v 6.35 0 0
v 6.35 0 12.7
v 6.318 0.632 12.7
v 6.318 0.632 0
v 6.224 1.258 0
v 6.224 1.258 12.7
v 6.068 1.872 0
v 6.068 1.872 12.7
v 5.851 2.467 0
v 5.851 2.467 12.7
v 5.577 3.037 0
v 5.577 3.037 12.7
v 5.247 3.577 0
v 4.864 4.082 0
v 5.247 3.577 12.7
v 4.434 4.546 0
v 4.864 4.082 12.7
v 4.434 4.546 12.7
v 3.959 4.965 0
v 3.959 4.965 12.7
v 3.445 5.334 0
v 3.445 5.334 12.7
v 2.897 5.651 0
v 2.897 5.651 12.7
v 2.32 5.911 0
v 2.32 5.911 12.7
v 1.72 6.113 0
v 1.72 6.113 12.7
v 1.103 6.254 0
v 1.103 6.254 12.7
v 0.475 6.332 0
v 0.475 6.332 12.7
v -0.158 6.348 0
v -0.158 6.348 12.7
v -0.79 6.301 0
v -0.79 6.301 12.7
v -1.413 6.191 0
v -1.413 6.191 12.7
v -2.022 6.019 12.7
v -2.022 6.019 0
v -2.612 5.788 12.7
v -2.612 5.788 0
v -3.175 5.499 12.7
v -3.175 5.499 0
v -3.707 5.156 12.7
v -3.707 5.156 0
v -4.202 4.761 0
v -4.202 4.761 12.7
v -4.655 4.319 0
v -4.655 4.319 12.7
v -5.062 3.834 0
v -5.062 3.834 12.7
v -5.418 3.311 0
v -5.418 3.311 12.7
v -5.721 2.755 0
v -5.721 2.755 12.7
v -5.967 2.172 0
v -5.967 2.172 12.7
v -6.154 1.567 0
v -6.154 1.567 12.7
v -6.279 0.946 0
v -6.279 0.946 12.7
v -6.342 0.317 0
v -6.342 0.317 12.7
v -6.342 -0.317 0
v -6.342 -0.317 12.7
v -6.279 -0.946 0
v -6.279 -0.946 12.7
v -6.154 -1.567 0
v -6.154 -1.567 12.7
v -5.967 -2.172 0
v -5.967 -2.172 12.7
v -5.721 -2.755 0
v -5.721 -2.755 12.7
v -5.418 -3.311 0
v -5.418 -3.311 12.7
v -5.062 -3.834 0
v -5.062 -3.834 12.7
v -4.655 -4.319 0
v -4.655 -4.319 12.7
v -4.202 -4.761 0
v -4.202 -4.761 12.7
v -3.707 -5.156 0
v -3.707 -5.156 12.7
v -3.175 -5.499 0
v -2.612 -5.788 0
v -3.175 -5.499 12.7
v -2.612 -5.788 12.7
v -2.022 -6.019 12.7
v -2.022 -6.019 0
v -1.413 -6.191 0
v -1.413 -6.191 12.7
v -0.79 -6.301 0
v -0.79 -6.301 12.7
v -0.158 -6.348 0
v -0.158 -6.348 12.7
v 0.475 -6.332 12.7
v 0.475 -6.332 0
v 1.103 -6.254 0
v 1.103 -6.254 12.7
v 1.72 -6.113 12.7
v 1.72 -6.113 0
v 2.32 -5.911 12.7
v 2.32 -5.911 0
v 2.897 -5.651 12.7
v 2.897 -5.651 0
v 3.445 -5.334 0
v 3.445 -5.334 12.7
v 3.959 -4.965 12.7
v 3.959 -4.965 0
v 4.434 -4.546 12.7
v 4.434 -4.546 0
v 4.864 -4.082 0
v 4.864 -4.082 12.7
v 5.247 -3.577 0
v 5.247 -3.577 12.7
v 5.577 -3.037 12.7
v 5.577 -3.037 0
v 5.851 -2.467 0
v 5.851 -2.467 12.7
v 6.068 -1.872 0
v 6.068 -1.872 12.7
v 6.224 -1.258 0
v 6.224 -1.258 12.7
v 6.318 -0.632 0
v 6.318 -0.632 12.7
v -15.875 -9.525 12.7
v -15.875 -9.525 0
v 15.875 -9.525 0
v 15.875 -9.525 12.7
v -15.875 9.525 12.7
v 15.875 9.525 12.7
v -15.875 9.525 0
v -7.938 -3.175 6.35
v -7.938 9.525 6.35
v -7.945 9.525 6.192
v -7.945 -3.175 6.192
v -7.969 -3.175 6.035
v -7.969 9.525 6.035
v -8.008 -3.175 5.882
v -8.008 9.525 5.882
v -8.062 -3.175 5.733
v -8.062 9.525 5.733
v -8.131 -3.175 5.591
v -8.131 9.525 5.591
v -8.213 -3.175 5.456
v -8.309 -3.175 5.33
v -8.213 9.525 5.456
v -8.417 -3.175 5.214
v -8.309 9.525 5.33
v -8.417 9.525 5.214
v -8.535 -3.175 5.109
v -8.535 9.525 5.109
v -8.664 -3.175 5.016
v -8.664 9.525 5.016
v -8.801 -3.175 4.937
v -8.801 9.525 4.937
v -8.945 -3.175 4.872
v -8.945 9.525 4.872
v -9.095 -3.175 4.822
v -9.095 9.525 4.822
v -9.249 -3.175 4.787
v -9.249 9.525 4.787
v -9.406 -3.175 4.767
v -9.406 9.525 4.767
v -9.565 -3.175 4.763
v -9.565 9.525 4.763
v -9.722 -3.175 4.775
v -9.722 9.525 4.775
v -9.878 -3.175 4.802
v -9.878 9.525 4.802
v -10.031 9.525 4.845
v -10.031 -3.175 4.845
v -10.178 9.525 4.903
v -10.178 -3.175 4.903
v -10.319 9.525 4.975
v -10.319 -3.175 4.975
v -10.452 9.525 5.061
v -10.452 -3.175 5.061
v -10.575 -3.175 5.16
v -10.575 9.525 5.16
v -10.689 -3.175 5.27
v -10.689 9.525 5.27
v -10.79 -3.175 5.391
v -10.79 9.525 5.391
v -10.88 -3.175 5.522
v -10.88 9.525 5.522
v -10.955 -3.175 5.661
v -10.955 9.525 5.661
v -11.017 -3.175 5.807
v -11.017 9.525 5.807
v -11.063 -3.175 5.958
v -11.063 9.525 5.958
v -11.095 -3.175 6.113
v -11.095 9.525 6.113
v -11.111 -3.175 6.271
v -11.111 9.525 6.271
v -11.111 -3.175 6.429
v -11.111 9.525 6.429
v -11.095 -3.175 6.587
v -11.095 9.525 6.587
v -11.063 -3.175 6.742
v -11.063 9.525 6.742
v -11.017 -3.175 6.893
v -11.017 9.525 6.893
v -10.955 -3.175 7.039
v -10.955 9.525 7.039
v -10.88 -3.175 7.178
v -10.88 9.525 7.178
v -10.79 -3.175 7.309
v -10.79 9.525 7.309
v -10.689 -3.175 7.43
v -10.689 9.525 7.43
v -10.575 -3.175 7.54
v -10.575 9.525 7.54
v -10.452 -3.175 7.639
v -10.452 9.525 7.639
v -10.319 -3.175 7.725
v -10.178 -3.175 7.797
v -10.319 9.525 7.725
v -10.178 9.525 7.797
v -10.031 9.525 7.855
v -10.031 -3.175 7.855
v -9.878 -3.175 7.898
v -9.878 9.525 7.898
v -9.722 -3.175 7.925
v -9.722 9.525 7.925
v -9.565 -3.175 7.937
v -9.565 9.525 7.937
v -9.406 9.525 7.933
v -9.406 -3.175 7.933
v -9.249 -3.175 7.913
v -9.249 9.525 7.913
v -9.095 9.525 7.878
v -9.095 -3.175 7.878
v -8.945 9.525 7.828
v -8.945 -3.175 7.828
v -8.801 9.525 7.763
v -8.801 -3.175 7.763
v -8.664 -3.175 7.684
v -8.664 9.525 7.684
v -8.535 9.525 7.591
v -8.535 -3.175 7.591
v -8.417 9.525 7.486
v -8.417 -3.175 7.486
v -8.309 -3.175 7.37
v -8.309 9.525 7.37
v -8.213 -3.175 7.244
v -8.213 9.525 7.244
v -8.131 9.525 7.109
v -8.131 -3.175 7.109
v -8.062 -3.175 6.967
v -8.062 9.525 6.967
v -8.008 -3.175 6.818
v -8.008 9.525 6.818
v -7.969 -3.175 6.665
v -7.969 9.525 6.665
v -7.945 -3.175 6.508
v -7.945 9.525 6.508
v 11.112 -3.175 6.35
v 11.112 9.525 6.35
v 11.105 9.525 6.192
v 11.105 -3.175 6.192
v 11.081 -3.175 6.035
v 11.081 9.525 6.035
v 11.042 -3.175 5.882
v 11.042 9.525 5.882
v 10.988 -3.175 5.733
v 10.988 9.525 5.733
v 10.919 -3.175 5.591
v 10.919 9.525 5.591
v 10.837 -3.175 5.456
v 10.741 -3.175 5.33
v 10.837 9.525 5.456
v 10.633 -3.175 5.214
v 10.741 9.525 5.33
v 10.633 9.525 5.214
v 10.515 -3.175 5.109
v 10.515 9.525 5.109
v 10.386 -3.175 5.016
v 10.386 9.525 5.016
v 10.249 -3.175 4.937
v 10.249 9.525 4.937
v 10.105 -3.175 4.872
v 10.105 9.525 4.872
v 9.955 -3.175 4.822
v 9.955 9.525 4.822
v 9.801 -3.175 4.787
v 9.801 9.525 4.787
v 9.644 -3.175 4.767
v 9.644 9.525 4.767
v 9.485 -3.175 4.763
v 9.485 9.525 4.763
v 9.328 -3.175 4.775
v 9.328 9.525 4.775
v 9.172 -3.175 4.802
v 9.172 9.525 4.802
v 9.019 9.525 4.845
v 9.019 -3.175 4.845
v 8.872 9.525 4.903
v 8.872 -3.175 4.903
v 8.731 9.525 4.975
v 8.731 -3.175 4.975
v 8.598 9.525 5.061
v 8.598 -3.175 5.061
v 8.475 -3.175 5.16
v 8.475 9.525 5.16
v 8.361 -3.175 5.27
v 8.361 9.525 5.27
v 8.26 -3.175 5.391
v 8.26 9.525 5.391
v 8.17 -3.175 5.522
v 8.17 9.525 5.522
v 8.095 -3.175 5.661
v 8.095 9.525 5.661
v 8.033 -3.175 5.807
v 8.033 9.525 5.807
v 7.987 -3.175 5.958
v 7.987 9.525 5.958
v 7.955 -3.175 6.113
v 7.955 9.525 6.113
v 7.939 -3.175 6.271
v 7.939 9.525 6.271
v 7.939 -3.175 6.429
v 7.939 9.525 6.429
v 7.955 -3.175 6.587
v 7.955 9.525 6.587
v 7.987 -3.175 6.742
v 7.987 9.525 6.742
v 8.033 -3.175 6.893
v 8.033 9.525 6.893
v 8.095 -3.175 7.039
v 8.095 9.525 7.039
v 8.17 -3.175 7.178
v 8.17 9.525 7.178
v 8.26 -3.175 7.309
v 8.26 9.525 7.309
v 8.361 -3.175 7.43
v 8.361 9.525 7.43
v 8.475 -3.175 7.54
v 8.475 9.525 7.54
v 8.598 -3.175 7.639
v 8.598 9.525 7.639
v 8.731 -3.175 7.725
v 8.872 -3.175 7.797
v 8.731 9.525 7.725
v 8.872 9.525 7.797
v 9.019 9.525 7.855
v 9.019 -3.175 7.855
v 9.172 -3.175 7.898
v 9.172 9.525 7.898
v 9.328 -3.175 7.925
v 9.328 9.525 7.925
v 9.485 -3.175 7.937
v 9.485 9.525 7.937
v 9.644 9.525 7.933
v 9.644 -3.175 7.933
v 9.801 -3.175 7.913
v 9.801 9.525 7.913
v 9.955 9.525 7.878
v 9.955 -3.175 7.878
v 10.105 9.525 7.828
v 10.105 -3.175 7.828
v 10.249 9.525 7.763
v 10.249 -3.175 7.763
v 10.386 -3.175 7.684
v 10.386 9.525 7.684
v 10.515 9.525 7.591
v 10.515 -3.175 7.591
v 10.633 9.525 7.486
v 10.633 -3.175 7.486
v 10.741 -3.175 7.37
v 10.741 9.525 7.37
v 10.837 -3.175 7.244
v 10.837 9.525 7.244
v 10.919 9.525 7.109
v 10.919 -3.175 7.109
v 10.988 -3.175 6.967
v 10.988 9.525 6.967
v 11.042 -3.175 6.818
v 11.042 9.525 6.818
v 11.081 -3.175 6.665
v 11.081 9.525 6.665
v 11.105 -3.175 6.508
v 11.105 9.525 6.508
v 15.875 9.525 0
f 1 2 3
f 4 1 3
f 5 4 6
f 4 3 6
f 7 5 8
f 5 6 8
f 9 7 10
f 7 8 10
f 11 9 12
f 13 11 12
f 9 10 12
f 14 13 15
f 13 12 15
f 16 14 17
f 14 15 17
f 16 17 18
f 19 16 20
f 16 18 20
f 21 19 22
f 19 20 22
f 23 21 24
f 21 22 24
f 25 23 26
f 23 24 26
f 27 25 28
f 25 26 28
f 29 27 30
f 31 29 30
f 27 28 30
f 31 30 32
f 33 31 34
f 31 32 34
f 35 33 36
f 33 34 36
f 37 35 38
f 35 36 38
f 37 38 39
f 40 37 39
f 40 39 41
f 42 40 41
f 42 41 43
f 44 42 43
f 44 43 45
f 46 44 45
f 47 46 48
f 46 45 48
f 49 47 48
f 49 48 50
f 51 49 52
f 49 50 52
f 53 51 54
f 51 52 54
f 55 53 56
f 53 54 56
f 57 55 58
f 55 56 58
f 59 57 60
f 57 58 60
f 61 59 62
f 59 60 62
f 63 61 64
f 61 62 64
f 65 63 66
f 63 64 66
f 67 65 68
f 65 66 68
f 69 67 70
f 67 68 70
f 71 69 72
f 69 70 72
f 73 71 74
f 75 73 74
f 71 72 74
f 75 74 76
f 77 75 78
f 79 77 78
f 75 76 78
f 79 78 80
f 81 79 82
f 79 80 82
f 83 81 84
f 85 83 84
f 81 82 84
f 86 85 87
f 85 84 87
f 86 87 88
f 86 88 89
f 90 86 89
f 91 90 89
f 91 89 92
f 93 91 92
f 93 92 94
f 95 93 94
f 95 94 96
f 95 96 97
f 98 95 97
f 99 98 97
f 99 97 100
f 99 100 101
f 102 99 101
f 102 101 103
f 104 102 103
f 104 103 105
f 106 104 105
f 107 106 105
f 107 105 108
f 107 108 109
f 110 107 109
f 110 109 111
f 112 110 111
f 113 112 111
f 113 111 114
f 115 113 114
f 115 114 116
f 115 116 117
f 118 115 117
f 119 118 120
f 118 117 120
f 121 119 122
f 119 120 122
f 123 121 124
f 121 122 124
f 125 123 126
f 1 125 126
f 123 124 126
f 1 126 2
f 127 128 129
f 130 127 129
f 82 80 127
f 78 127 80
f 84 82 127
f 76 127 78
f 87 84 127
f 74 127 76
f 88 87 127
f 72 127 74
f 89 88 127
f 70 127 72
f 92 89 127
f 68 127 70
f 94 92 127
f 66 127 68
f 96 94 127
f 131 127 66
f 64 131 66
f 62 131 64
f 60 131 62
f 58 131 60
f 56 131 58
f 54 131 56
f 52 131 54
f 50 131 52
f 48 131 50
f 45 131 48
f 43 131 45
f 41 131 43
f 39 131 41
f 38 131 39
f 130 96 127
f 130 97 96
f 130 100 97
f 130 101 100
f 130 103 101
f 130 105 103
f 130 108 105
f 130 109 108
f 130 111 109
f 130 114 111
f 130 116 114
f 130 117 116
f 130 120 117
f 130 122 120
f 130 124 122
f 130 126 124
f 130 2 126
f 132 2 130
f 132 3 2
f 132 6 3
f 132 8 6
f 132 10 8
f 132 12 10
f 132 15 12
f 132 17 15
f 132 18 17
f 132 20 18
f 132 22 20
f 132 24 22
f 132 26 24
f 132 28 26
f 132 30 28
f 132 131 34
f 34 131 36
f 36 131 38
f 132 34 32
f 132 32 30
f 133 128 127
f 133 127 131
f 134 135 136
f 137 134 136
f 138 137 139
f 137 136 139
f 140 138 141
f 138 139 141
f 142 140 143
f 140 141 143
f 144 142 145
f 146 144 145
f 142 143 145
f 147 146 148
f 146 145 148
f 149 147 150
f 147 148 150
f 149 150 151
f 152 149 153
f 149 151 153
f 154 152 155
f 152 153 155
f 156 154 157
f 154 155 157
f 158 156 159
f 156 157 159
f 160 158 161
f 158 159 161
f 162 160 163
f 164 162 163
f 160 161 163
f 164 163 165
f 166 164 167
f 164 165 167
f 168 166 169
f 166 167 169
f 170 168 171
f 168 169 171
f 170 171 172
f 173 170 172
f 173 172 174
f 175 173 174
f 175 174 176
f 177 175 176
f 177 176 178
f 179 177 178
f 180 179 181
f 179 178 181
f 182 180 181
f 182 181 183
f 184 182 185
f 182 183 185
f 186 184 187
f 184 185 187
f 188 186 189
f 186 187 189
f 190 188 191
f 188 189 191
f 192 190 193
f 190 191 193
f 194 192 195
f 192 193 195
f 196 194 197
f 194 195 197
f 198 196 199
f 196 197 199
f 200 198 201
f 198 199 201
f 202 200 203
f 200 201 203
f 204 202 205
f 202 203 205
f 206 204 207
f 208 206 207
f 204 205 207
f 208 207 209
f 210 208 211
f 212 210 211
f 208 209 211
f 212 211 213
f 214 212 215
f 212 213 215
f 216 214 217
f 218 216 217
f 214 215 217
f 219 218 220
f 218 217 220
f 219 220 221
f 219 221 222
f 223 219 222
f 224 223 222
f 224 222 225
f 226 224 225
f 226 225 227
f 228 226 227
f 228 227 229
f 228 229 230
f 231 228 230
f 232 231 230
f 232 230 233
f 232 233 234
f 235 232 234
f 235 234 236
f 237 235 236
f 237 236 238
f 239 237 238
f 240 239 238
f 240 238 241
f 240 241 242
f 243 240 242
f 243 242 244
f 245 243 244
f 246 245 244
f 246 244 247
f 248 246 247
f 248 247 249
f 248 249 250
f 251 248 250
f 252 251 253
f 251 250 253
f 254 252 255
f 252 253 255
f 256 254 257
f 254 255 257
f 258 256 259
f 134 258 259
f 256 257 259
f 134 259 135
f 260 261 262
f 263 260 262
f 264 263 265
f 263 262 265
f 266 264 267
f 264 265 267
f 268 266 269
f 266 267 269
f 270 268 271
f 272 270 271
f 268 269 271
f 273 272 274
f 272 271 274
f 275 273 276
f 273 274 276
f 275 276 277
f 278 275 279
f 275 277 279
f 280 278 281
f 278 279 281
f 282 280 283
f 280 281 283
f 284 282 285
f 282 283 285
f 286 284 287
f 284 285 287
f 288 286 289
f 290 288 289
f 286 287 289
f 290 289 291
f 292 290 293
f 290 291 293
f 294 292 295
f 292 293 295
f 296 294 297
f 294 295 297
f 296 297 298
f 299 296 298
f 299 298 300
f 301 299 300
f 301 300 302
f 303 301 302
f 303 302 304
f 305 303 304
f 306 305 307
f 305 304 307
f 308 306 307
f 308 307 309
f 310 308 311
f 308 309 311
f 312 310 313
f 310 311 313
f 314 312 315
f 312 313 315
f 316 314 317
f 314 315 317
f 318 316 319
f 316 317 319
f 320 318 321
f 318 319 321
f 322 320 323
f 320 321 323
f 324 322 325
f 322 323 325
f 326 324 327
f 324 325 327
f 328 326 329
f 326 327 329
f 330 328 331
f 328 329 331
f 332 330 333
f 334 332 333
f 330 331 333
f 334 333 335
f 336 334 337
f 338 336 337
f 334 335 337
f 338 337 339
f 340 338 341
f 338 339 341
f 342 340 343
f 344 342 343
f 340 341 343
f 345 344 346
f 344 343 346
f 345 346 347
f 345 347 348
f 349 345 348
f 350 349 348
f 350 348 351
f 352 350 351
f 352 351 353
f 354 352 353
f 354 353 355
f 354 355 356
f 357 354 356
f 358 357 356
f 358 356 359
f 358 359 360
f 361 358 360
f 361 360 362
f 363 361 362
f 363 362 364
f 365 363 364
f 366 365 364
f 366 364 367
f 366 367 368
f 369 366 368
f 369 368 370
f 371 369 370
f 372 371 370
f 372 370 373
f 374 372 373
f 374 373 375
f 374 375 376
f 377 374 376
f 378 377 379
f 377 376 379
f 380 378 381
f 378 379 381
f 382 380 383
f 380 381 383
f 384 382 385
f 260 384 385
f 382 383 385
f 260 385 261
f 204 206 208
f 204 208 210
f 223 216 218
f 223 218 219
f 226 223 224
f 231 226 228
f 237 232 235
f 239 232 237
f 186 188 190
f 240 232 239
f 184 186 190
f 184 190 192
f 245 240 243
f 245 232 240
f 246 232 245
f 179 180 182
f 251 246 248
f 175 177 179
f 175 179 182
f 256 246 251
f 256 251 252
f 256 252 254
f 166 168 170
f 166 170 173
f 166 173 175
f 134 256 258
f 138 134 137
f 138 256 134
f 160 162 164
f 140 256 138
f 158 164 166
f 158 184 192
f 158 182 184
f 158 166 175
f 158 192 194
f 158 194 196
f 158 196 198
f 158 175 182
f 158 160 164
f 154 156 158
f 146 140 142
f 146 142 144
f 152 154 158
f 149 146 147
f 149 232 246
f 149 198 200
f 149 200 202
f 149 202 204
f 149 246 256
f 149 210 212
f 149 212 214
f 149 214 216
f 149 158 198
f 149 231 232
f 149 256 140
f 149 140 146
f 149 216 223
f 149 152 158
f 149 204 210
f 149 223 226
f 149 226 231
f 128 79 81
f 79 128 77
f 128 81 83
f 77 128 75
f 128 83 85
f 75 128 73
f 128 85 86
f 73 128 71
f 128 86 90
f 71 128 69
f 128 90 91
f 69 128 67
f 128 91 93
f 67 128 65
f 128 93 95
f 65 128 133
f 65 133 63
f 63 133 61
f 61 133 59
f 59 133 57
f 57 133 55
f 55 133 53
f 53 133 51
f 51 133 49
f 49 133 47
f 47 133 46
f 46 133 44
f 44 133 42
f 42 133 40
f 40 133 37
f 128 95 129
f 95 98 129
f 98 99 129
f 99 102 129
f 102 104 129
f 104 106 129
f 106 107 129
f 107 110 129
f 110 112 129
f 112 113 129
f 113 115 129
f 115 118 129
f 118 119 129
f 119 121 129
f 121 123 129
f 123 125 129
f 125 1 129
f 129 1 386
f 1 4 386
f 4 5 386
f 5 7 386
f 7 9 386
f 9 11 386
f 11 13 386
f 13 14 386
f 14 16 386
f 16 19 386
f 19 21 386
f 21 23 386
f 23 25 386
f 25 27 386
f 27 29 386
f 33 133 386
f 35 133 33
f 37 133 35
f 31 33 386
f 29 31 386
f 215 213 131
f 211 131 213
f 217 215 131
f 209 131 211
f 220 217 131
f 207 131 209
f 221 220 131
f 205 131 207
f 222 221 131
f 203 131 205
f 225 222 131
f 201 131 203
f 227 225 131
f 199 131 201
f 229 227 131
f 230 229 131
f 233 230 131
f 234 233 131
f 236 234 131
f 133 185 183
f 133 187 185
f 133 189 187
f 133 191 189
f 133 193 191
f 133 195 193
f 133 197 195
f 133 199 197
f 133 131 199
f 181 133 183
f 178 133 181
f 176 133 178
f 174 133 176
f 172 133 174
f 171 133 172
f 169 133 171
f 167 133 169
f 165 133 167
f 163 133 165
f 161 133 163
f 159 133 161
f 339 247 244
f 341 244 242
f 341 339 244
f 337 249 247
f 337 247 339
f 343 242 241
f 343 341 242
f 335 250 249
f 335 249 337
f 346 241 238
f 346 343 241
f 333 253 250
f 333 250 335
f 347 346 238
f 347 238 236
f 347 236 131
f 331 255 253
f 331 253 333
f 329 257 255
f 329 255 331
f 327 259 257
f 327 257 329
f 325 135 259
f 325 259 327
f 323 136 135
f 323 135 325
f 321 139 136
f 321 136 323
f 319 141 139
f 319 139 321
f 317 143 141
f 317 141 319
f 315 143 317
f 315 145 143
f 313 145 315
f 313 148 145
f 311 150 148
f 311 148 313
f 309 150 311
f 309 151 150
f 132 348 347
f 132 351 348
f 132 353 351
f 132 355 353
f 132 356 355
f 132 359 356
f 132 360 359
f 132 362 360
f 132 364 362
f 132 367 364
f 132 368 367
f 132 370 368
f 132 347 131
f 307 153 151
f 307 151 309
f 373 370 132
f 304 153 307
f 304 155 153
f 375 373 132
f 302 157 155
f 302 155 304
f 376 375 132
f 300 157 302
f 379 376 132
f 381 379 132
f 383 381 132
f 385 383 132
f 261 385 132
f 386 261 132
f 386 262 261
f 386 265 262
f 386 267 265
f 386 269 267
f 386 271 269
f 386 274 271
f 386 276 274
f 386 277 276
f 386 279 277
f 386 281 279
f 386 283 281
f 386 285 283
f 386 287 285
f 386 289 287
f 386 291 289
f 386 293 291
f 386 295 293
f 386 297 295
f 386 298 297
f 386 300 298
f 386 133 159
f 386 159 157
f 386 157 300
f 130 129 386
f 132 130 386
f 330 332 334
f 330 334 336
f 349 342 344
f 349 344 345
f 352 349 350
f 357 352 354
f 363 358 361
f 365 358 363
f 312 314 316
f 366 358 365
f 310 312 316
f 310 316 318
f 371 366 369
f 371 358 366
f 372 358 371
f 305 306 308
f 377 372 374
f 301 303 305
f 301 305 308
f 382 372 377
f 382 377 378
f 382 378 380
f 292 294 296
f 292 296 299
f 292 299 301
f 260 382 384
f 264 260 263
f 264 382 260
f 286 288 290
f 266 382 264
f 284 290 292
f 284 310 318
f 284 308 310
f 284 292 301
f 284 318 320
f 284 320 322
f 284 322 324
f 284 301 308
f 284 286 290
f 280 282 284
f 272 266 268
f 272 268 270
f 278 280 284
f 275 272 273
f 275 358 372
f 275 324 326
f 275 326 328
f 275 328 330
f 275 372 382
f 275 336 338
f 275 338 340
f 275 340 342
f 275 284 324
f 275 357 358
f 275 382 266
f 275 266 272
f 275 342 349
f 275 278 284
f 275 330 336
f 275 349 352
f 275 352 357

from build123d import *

# Parameters (mm, degrees)
SKETCH1_W           = 31.75
SKETCH1_H           = 19.05
BOSS_EXTRUDE1_DEPTH = 12.7
SKETCH2_R           = 6.35
CUT_EXTRUDE1_DEPTH  = 12.7
SKETCH3_R           = 1.5875
CUT_EXTRUDE2_DEPTH  = 12.7


with BuildPart() as part:
    # Sketch1 → Boss-Extrude1 (new body)
    with BuildSketch(Plane.XY):
        Rectangle(SKETCH1_W, SKETCH1_H)
    extrude(amount=BOSS_EXTRUDE1_DEPTH)

    # Sketch2 → Cut-Extrude1 (cut)
    with BuildSketch(Plane.XY.offset(12.7)):
        Circle(SKETCH2_R)
    extrude(amount=-CUT_EXTRUDE1_DEPTH, mode=Mode.SUBTRACT)

    # Sketch3 → Cut-Extrude2 (cut)
    with BuildSketch(Plane(origin=(0, 9.525, 0), x_dir=(1, 0, 0), z_dir=(0, 1, 0))):
        with Locations((-9.525, -6.35)):
            Circle(SKETCH3_R)
        with Locations((9.525, -6.35)):
            Circle(SKETCH3_R)
    extrude(amount=-CUT_EXTRUDE2_DEPTH, mode=Mode.SUBTRACT)


solid = part.part
